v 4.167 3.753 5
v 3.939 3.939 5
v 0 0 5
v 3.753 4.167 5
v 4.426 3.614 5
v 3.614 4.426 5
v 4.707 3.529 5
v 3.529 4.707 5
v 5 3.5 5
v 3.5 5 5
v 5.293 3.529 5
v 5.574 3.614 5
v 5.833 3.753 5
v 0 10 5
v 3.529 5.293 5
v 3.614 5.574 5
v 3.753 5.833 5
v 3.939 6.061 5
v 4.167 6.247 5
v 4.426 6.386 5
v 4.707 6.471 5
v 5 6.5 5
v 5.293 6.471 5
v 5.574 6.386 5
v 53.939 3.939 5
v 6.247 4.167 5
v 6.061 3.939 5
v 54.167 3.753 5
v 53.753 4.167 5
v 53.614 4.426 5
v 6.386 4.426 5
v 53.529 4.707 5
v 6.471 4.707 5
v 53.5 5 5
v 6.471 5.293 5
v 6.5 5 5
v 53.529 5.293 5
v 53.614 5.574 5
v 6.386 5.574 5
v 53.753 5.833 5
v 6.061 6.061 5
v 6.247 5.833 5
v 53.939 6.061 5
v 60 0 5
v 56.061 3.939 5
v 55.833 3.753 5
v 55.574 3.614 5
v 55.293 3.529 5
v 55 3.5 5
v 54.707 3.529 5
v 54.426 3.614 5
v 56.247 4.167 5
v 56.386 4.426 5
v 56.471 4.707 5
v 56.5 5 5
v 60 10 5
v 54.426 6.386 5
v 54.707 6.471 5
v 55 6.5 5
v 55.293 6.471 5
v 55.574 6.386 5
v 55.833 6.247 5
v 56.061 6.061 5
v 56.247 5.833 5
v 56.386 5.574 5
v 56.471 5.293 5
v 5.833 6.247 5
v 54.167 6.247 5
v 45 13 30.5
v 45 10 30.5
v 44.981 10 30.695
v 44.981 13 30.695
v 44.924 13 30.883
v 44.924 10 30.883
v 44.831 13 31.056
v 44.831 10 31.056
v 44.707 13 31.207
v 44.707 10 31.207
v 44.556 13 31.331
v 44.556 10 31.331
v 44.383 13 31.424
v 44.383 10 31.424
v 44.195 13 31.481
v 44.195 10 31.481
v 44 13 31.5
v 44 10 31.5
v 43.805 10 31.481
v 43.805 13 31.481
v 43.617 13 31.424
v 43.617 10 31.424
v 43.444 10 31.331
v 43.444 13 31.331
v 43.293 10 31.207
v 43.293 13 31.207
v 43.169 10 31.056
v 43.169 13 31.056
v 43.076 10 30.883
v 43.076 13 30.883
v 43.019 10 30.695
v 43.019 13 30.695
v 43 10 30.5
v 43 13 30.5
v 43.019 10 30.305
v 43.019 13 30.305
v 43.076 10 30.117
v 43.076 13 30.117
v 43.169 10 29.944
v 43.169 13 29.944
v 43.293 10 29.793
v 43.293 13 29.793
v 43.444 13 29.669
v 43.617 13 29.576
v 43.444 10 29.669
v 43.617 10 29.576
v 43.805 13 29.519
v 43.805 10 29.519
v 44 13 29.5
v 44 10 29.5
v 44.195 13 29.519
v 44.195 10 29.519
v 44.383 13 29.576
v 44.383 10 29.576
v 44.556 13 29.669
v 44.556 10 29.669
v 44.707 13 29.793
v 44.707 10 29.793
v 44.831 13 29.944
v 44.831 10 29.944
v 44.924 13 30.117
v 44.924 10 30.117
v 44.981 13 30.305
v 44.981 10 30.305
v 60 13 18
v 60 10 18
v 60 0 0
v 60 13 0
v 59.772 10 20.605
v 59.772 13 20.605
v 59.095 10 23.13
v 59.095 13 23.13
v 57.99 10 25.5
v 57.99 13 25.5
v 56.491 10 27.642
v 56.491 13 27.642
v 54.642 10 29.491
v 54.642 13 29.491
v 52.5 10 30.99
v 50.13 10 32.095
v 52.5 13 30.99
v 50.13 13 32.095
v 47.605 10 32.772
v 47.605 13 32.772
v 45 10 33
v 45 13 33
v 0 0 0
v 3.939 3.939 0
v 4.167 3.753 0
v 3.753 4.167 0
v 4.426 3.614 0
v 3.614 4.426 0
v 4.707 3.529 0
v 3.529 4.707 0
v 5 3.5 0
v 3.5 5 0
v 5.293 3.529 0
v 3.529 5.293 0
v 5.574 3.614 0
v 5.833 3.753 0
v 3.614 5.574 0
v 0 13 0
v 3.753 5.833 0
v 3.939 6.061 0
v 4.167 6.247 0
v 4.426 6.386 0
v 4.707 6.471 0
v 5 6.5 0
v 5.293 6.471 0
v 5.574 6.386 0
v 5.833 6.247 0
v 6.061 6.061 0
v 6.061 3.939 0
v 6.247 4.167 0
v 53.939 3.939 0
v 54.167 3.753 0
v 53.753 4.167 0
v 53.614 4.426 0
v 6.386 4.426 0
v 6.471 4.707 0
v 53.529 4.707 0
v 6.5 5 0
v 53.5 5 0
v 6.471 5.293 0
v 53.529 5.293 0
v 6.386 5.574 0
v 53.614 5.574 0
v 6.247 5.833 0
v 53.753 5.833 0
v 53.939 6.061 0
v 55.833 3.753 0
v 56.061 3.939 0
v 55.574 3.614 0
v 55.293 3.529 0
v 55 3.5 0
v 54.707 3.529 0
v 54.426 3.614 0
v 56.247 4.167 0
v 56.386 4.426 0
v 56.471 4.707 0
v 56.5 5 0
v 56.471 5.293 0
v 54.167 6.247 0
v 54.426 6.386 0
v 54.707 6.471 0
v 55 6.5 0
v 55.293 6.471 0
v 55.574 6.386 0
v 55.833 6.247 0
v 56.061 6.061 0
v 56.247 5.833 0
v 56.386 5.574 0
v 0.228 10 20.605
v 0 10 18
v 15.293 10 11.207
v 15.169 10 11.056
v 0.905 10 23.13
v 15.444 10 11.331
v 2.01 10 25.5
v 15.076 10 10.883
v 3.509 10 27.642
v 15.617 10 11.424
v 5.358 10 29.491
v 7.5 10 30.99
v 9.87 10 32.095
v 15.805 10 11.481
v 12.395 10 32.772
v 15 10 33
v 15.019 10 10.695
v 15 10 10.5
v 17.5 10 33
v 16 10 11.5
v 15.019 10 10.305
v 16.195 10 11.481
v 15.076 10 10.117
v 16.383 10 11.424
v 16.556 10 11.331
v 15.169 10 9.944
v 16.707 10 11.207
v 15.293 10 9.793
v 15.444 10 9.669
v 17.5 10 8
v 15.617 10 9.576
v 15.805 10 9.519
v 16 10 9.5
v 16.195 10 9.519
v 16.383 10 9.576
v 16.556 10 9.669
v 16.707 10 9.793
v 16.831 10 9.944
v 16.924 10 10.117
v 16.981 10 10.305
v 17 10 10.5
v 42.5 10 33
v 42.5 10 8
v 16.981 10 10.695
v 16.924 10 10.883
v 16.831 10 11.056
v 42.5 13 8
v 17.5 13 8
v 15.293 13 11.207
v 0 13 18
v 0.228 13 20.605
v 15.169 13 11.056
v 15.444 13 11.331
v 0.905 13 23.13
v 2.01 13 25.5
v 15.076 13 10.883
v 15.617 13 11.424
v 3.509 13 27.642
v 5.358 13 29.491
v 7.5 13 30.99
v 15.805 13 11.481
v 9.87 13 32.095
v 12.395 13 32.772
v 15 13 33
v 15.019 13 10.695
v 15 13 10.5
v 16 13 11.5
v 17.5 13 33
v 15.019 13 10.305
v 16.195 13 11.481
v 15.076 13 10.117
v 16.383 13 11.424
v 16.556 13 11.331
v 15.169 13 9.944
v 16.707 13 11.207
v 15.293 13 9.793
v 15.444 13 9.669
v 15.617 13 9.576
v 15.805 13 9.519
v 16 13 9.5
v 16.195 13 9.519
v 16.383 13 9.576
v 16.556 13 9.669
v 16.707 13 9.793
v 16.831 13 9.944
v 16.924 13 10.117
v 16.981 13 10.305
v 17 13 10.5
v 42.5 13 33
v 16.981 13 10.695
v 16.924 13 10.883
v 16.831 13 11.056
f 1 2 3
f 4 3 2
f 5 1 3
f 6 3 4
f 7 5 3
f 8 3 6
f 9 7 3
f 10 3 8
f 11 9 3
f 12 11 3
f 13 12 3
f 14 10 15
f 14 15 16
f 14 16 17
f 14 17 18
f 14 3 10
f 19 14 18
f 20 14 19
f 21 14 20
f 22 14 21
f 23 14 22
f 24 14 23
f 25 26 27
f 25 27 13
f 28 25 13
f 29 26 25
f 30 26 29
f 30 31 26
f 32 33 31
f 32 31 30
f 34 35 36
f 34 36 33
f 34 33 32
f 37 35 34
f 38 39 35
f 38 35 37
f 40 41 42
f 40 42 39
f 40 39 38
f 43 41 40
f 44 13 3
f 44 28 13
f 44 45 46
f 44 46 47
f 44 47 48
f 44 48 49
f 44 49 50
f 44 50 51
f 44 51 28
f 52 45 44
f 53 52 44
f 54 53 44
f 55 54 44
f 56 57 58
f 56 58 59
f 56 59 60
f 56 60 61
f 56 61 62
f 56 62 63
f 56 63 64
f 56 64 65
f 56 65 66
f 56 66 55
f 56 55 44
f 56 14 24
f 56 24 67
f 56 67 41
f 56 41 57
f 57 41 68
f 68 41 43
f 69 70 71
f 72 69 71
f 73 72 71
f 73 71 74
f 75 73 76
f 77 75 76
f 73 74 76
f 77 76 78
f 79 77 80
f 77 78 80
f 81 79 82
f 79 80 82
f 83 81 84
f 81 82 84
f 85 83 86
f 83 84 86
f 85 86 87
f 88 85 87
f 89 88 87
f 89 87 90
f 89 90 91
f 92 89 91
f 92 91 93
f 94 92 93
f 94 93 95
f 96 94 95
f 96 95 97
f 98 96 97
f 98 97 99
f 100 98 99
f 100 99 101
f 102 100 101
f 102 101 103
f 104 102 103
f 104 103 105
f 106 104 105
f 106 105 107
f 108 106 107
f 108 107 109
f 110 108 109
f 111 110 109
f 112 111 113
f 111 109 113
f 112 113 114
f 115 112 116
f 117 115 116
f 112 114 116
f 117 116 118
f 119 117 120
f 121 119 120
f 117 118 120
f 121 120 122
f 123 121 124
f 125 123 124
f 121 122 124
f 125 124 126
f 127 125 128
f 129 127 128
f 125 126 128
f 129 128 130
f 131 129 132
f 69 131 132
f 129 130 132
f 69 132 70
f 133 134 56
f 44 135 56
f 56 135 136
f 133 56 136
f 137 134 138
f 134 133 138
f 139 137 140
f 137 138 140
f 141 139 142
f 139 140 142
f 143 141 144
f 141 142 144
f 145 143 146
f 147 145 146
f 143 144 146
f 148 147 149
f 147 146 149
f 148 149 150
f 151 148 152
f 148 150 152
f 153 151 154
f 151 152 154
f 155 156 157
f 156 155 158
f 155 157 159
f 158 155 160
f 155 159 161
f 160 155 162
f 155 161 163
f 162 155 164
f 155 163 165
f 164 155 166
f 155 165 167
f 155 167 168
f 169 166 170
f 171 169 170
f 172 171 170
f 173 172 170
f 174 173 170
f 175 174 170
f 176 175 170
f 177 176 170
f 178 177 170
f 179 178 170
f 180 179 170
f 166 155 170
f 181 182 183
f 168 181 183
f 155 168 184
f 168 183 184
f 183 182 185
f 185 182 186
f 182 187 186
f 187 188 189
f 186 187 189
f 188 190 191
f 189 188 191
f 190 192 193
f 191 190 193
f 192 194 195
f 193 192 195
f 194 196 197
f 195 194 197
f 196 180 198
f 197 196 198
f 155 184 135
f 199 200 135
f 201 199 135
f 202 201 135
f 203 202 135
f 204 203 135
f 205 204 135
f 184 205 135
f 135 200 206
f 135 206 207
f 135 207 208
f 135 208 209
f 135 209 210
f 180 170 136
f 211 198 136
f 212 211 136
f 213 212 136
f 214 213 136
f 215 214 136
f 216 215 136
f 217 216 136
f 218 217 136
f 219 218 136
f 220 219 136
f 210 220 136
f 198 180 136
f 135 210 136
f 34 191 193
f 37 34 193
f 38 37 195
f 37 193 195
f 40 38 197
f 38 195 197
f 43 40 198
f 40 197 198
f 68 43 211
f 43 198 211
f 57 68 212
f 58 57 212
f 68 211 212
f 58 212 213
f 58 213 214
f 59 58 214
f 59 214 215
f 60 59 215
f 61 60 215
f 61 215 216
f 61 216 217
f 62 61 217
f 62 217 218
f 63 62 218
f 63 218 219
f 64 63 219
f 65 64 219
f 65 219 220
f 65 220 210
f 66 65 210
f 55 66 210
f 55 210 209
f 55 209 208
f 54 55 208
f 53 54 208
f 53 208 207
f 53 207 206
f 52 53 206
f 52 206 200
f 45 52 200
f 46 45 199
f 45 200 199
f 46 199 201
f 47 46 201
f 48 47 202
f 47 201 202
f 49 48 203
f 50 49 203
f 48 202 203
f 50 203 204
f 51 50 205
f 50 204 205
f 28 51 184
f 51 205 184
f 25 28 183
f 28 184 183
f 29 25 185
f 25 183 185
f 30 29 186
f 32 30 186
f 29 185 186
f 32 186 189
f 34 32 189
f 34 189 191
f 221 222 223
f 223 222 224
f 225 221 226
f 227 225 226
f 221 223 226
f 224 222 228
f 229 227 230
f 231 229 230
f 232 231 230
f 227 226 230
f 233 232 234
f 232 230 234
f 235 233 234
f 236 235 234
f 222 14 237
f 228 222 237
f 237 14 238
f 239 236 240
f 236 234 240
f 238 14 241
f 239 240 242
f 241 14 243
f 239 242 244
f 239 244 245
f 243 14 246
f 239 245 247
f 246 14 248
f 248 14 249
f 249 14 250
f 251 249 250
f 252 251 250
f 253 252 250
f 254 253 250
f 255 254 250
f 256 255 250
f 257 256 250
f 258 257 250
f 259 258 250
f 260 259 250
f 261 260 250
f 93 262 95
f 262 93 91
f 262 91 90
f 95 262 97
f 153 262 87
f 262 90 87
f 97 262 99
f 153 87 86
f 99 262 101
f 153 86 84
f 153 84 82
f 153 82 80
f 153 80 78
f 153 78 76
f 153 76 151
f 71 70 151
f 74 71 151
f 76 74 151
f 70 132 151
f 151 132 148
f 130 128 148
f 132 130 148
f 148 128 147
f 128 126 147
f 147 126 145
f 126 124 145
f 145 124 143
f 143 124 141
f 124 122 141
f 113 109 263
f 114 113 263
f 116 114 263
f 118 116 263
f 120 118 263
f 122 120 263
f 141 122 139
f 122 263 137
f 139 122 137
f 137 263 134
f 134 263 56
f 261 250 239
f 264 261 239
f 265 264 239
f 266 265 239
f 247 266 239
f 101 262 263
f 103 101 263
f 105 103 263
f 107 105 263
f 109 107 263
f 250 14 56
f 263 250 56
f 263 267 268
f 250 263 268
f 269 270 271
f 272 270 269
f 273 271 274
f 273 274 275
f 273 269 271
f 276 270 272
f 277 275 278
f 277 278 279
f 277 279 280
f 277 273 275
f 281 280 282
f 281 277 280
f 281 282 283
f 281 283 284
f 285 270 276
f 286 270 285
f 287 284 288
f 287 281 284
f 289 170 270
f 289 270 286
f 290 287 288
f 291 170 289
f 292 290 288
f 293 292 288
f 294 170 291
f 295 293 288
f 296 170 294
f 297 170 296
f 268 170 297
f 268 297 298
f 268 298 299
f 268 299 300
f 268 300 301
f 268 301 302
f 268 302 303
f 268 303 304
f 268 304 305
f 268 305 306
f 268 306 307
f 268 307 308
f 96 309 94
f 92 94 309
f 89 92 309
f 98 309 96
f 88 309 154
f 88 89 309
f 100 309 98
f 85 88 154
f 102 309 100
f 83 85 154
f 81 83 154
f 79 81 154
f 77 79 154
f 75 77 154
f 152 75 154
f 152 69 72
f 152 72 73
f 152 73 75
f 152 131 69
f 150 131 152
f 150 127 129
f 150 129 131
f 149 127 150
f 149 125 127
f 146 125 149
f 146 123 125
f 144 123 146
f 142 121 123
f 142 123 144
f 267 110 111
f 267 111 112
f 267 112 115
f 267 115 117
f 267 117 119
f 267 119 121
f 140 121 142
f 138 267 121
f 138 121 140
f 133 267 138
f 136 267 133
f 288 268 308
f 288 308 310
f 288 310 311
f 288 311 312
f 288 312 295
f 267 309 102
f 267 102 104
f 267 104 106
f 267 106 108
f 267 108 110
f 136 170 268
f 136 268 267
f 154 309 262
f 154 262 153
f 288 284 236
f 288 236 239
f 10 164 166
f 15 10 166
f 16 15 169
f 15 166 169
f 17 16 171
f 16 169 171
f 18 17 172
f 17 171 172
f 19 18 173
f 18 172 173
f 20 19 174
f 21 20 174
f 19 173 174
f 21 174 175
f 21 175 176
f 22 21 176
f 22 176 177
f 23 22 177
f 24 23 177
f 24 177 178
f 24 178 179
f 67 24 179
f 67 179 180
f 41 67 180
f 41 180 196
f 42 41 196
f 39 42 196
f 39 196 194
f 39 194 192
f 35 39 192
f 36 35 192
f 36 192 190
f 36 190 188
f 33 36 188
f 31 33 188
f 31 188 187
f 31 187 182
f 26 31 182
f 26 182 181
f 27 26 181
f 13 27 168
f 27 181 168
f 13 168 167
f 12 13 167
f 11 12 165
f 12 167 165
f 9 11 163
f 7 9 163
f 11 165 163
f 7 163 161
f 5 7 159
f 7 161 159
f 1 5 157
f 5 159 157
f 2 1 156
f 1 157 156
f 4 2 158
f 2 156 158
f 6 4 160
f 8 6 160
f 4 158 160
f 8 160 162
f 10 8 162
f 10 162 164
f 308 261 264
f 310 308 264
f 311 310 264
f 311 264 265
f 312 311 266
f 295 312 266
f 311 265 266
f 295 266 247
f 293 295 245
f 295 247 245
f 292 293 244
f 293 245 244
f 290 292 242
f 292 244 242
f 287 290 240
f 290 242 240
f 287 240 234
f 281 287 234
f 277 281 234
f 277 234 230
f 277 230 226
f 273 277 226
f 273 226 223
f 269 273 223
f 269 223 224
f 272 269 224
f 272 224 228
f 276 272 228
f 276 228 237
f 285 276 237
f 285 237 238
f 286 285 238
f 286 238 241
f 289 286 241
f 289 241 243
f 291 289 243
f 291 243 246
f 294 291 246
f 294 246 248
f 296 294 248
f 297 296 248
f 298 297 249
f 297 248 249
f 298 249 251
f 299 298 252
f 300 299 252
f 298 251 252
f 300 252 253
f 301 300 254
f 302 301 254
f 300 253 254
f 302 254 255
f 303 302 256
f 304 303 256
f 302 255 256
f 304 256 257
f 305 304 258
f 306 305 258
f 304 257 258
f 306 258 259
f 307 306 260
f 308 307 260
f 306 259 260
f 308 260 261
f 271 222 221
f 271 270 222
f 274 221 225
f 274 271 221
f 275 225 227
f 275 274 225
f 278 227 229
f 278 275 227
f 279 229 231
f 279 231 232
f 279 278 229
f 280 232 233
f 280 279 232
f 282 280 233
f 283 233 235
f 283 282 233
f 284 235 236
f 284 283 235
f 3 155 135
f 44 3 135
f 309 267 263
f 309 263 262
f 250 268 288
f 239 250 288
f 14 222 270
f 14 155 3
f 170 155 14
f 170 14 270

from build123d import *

# Parameters (mm, degrees)
F0_W     = 60
F0_H     = 13
F1_DEPTH = 5
F3_D     = 3
F4_W     = 60
F4_H     = 3
F5_DEPTH = 28
F6_W     = 25
F6_H     = 25
F7_DEPTH = 5
F9_D     = 2
F10_R    = 15


with BuildPart() as f1:
    # F0 (on Top) → F1 (new body)
    with BuildSketch(Plane.XY):
        with Locations((30, 6.5)):
            Rectangle(F0_W, F0_H)
    extrude(amount=F1_DEPTH)

    # F3 (through all)
    with Locations(Plane.XY.offset(5)):
        with Locations((5, 5), (55, 5)):
            Hole(F3_D / 2)

    # F4 (on face) → F5 (join)
    with BuildSketch(Plane.XY.offset(5)):
        with Locations((30, 11.5)):
            Rectangle(F4_W, F4_H)
    extrude(amount=F5_DEPTH)

    # F6 (on face) → F7 (cut)
    with BuildSketch(Plane(origin=(0, 13, 0), x_dir=(-1, 0, 0), z_dir=(0, 1, 0))):
        with Locations((-30, 20.5)):
            Rectangle(F6_W, F6_H)
    extrude(amount=-F7_DEPTH, mode=Mode.SUBTRACT)

    # F9 (through all)
    with Locations(Plane(origin=(0, 13, 0), x_dir=(-1, 0, 0), z_dir=(0, 1, 0))):
        with Locations((-44, 30.5), (-16, 10.5)):
            Hole(F9_D / 2)

    # F10
    f10_edges = [f1.edges().sort_by_distance(p)[0] for p in [
        (0, 11.5, 33),
        (60, 11.5, 33),
    ]]
    fillet(f10_edges, radius=F10_R)


solid = f1.part
